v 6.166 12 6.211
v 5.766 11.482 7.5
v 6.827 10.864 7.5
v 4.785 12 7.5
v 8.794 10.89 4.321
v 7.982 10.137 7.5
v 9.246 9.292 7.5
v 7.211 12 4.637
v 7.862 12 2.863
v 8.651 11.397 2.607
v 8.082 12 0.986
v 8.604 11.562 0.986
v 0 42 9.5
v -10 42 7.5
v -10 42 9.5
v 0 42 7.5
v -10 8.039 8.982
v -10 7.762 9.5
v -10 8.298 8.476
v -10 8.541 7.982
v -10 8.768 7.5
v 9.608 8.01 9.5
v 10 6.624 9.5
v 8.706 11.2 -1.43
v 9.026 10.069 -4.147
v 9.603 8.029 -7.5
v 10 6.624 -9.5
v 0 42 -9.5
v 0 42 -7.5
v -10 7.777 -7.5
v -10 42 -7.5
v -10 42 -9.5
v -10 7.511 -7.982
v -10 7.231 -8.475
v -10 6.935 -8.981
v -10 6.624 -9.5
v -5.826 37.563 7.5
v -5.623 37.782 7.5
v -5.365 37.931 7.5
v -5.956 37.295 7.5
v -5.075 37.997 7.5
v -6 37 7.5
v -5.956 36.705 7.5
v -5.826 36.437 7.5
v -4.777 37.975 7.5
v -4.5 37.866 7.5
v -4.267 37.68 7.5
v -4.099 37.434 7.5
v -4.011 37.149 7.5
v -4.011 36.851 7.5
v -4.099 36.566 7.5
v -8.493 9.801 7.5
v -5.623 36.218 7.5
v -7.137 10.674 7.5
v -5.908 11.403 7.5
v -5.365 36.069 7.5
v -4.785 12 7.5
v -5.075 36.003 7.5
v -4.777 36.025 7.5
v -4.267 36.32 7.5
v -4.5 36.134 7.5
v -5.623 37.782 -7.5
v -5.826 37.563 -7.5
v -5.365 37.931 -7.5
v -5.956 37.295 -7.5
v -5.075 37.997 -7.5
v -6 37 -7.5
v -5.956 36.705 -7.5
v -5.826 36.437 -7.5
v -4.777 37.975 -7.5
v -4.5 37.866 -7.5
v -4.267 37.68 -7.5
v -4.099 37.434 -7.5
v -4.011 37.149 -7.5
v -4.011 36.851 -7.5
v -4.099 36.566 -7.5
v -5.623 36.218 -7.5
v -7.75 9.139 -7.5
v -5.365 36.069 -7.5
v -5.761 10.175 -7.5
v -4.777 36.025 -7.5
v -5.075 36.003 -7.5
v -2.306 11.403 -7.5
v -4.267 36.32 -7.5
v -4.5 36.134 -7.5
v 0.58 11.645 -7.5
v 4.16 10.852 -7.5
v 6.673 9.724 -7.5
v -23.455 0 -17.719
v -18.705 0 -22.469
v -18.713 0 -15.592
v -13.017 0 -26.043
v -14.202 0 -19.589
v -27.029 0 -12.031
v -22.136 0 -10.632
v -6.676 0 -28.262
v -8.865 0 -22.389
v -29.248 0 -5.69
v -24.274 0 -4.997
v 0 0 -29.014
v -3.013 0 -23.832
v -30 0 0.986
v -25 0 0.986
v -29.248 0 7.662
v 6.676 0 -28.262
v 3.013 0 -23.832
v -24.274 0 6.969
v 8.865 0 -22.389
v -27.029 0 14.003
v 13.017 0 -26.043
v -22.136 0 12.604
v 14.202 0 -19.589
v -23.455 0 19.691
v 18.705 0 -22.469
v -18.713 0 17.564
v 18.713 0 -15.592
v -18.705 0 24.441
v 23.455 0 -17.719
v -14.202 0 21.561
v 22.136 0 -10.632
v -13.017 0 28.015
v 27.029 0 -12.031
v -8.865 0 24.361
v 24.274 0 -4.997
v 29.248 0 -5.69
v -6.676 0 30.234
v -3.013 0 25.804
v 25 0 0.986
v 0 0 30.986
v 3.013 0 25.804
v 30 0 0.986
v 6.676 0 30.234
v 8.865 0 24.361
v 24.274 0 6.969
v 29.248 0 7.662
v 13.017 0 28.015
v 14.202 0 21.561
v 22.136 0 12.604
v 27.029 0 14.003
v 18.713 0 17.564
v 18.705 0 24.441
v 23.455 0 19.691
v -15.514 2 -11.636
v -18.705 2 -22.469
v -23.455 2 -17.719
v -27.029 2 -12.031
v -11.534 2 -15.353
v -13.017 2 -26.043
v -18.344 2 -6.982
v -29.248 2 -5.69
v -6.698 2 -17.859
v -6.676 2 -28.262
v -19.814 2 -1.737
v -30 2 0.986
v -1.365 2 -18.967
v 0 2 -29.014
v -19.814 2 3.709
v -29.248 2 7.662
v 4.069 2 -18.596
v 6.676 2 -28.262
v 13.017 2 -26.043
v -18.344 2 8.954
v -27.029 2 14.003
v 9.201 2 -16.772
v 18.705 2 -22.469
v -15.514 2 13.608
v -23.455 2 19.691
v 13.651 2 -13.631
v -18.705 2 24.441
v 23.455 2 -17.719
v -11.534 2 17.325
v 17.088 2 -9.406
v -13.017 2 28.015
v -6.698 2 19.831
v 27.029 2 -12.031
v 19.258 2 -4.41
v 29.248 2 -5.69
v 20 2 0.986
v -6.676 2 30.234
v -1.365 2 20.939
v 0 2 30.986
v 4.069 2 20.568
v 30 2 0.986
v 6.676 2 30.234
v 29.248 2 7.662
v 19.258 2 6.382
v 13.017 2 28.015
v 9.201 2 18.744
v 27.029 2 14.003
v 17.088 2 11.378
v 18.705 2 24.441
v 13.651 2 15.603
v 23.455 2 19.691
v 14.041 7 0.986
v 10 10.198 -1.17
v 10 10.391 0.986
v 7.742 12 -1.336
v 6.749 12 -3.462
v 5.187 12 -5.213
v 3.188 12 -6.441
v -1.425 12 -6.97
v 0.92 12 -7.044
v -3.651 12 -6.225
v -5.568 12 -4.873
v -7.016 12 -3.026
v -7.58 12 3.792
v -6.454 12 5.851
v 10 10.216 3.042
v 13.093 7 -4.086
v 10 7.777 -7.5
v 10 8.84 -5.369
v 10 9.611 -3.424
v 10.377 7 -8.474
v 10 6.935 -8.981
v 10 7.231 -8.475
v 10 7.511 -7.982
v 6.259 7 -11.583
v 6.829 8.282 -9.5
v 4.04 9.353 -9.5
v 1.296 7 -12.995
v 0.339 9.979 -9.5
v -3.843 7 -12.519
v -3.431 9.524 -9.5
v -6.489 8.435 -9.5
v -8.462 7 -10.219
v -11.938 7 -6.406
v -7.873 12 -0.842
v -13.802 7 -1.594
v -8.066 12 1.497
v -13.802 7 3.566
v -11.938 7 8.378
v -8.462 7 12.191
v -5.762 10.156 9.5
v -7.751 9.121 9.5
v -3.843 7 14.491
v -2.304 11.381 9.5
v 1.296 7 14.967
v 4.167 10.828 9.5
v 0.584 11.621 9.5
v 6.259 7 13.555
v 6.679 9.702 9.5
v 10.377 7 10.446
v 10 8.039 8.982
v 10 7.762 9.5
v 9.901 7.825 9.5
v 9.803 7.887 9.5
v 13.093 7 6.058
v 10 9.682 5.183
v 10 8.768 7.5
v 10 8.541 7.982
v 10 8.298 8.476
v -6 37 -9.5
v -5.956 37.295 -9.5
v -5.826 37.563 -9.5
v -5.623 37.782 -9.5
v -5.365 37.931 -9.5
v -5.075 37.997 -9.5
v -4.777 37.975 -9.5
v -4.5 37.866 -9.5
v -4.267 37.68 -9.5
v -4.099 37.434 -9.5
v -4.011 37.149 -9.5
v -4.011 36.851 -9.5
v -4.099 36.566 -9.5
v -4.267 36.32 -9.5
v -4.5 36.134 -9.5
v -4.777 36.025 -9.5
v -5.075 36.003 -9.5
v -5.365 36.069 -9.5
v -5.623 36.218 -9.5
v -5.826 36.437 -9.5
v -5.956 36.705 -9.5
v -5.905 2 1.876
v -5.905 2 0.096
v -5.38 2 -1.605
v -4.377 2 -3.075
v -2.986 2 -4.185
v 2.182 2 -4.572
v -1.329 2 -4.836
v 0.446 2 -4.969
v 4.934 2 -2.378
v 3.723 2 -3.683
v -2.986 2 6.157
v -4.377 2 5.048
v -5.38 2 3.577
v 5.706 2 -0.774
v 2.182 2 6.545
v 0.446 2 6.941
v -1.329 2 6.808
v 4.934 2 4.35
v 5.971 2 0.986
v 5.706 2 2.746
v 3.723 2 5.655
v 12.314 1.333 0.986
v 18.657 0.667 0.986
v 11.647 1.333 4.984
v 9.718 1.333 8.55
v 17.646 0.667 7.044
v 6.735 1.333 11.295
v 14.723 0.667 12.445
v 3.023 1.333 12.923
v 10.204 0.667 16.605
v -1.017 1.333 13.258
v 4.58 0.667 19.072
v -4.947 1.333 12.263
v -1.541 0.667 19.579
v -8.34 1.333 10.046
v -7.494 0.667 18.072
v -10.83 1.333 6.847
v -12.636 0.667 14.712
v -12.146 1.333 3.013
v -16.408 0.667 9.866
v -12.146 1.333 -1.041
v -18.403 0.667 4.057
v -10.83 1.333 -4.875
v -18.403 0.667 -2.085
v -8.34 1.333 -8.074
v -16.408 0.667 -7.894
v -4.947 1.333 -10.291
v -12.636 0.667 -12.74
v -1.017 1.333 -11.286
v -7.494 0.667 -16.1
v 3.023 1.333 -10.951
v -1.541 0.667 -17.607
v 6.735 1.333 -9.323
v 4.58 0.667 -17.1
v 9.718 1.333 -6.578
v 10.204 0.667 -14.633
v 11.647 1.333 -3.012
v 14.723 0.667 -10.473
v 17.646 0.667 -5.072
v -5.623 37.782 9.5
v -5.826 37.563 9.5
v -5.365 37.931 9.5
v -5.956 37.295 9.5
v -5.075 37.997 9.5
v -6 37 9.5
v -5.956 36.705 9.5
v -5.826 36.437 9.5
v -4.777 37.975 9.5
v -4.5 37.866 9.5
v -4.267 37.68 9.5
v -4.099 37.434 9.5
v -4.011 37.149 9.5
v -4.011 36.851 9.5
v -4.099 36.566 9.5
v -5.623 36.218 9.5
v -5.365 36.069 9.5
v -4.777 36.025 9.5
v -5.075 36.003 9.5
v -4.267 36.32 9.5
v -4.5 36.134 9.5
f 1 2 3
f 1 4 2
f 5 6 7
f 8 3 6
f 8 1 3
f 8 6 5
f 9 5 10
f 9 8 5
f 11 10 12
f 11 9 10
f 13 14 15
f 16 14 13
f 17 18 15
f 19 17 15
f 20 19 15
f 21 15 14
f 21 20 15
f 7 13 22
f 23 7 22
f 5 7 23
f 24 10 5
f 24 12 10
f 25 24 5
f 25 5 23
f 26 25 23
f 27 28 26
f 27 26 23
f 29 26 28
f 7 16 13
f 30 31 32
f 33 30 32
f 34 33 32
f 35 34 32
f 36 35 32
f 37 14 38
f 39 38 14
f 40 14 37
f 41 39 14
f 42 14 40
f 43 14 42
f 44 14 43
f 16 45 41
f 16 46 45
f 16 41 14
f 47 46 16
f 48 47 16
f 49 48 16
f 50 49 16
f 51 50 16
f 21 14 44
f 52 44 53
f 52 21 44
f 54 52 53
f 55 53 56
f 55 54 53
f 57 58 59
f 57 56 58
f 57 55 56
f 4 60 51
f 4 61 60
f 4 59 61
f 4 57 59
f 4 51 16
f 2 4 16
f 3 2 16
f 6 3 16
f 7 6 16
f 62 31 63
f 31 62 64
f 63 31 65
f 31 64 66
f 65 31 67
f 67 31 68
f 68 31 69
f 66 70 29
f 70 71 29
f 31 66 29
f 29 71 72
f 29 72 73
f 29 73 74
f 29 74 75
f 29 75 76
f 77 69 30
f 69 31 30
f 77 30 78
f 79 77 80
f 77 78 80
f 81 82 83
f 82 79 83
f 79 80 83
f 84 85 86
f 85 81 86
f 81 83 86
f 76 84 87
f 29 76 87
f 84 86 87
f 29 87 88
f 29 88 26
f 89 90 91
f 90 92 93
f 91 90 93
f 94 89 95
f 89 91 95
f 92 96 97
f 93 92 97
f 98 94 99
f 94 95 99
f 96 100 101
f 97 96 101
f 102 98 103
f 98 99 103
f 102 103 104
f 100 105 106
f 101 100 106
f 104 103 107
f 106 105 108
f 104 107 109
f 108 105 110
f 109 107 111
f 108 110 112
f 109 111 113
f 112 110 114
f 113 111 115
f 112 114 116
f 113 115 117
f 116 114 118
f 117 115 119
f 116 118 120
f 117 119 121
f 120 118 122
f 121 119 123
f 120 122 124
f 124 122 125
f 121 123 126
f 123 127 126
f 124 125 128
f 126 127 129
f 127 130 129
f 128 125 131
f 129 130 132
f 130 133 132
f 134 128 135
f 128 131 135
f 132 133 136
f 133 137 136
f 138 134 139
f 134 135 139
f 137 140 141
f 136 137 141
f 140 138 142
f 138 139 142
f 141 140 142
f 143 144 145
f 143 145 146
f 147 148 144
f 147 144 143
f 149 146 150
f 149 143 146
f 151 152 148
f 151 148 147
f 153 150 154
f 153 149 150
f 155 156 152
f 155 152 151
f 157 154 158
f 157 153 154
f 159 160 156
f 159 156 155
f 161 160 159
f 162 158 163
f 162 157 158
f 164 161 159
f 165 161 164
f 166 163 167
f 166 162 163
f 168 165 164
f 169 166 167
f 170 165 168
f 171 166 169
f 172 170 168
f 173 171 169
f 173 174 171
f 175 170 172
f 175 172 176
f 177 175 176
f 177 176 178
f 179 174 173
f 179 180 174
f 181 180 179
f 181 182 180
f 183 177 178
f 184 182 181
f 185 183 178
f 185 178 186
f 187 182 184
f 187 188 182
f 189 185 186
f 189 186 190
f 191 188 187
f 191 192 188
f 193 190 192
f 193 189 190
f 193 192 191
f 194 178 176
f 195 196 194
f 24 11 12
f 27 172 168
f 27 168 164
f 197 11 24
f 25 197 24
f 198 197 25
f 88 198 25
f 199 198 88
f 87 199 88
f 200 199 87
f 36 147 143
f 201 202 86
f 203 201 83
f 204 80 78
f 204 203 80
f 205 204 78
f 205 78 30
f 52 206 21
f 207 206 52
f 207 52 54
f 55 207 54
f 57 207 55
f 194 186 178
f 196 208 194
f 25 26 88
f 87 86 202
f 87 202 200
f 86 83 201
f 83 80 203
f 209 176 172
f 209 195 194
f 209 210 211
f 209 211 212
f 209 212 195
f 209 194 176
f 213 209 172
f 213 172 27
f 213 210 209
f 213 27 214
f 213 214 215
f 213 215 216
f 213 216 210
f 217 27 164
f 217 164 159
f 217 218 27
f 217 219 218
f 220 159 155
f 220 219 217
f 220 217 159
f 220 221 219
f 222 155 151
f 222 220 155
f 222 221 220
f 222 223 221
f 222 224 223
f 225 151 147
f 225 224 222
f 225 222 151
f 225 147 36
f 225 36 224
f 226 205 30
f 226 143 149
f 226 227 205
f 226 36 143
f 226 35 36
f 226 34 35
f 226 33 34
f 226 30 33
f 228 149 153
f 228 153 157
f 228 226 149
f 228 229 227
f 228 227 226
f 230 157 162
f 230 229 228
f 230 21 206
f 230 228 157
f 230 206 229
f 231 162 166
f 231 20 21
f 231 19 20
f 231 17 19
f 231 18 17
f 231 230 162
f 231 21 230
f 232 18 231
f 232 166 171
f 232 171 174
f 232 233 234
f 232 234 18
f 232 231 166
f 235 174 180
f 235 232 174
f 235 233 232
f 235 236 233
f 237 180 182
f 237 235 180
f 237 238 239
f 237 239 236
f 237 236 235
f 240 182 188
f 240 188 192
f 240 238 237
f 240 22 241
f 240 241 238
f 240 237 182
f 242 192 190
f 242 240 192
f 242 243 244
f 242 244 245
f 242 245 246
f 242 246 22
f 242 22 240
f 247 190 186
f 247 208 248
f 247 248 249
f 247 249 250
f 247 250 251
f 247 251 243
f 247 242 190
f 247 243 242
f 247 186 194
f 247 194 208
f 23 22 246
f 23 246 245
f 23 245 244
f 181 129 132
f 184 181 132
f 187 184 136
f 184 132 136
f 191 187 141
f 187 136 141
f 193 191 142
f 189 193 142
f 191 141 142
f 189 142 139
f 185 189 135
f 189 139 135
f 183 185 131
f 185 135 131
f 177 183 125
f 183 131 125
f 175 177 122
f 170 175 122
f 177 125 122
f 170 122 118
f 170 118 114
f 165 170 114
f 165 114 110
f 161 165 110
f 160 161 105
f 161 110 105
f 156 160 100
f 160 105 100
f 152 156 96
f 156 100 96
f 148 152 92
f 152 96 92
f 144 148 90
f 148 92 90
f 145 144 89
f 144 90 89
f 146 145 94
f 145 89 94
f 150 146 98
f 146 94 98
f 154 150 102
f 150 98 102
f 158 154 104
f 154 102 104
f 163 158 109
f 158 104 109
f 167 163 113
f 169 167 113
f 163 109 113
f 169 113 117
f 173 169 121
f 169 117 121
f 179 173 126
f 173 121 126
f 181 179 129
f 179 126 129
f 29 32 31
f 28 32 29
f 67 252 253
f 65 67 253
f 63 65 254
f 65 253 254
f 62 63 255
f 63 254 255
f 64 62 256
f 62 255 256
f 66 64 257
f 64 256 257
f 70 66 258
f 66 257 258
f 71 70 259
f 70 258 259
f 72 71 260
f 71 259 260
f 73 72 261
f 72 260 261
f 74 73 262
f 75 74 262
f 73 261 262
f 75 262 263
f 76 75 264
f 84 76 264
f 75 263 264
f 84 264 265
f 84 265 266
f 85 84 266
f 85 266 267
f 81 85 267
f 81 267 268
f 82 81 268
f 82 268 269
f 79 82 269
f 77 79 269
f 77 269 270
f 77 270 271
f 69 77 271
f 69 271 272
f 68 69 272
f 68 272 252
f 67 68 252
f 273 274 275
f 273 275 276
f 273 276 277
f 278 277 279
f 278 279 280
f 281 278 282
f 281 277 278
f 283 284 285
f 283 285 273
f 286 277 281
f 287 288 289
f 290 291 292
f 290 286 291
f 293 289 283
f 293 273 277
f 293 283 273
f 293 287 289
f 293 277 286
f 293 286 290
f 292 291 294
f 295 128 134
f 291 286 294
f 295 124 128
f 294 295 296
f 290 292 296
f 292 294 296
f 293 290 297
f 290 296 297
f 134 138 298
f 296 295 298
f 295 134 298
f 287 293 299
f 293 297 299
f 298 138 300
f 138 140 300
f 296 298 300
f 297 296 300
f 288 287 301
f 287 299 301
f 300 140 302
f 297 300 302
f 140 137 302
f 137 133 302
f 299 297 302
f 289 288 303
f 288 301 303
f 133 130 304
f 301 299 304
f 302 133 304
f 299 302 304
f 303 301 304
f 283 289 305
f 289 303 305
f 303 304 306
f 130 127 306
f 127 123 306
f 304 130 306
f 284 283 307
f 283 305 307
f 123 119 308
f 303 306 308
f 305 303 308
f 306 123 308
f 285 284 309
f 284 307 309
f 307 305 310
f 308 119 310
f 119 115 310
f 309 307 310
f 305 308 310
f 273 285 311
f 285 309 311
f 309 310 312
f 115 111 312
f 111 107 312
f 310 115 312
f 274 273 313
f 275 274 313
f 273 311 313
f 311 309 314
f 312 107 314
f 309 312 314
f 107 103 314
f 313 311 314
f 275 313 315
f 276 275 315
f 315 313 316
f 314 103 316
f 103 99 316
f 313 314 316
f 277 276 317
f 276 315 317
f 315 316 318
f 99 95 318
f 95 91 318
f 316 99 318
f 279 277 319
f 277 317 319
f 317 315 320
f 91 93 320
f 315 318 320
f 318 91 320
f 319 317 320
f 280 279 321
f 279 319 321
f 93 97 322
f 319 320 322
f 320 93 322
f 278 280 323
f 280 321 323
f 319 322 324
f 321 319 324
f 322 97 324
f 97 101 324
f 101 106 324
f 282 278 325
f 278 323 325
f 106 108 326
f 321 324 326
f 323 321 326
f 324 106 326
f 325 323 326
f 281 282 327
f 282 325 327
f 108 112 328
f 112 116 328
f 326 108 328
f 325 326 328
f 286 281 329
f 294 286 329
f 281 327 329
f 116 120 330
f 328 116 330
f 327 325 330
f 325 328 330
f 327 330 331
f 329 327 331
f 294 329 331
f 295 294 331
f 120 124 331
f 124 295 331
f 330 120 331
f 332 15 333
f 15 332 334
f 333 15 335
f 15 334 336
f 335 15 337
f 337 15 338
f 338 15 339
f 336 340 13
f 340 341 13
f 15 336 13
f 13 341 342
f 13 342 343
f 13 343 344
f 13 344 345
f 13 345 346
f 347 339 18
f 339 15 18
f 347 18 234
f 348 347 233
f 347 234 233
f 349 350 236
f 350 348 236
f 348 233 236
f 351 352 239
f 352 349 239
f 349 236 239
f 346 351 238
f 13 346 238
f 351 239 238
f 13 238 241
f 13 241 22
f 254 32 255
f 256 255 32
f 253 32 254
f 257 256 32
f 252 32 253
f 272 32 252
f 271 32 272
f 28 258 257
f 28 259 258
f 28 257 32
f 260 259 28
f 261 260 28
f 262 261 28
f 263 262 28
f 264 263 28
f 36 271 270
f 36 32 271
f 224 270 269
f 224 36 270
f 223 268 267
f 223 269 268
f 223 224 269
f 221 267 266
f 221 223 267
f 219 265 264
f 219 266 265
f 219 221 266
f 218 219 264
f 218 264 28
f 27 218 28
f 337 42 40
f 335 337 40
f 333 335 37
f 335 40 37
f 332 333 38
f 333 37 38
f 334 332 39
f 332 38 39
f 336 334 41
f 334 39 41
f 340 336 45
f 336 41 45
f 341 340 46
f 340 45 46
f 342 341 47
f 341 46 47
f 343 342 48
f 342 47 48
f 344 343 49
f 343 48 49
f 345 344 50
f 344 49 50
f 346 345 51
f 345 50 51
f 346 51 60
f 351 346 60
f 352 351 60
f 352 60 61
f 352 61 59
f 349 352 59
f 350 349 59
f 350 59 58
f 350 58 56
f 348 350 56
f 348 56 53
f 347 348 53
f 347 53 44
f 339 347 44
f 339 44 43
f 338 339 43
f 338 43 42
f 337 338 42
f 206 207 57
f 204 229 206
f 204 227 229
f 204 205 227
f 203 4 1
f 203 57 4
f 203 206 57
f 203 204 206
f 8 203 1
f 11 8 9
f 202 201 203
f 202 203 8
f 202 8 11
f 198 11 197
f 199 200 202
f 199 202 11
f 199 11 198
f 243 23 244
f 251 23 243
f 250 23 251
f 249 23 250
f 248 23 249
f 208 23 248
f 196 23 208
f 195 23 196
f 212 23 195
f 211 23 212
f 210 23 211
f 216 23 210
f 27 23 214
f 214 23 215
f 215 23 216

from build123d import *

# Parameters (mm, degrees)
SKETCH1_R           = 30
BOSS_EXTRUDE1_DEPTH = 2
SKETCH2_R           = 20
BOSS_EXTRUDE2_DEPTH = 10
BOSS_EXTRUDE2_TAPER = 50
SKETCH3_W           = 20
SKETCH3_H           = 2
BOSS_EXTRUDE3_DEPTH = 40
CUT_EXTRUDE1_REACH  = 67.598
CUT_EXTRUDE2_REACH  = 67.598
SKETCH7_R           = 1
SKETCH8_R           = 25
CUT_EXTRUDE3_DEPTH  = 2
CUT_EXTRUDE3_DRAFT  = -84


with BuildPart() as part:
    # Sketch1 → Boss-Extrude1 (new body)
    with BuildSketch(Plane(origin=(0, 0, 0), x_dir=(1, 0, 0), z_dir=(0, 1, 0))):
        with Locations(Location((0, -0.986006094, 0), (0, 0, 270))):
            Circle(SKETCH1_R)
    extrude(amount=BOSS_EXTRUDE1_DEPTH)

    # Sketch2 → Boss-Extrude2 (add)
    with BuildSketch(Plane(origin=(0, 2, 0), x_dir=(1, 0, 0), z_dir=(0, 1, 0))):
        with Locations((0, -0.986006094)):
            Circle(SKETCH2_R)
    extrude(amount=BOSS_EXTRUDE2_DEPTH, taper=BOSS_EXTRUDE2_TAPER)

    # Sketch3 → Boss-Extrude3 (add)
    with BuildSketch(Plane(origin=(0, 2, 0), x_dir=(1, 0, 0), z_dir=(0, 1, 0))):
        with Locations((0, 8.5)):
            Rectangle(SKETCH3_W, SKETCH3_H)
        with Locations((0, -8.5)):
            Rectangle(SKETCH3_W, SKETCH3_H)
    extrude(amount=BOSS_EXTRUDE3_DEPTH)

    # Cut-Extrude1: up to this face of the body (flat: up to its plane)
    cut_extrude1_end = Plane(part.part.faces().sort_by_distance((0, 26.093864251, 9.5))[0])
    # Sketch5 → Cut-Extrude1 (cut, up to the picked face)
    with BuildSketch(Plane(origin=(0, 0, -9.5), x_dir=(-1, 0, 0), z_dir=(0, 0, -1)), mode=Mode.PRIVATE) as cut_extrude1_sk1:
        Polygon((0, 42), (-10, 6.623548306), (-10, 42), align=None)
    cut_extrude1_tool1 = split(extrude(cut_extrude1_sk1.sketch, amount=-CUT_EXTRUDE1_REACH, mode=Mode.PRIVATE), bisect_by=cut_extrude1_end, keep=Keep.BOTH, mode=Mode.PRIVATE)
    add(cut_extrude1_tool1.solids().sort_by(Axis((6.666667, 30.207849, -9.5), (0, 0, 1)))[0], mode=Mode.SUBTRACT)

    # Cut-Extrude2: up to this face of the body (flat: up to its plane)
    cut_extrude2_end = Plane(part.part.faces().sort_by_distance((-2.565960576, 24.498389602, 9.5))[0])
    # Sketch7 → Cut-Extrude2 (cut, up to the picked face)
    with BuildSketch(Plane(origin=(0, 0, -9.5), x_dir=(-1, 0, 0), z_dir=(0, 0, -1)), mode=Mode.PRIVATE) as cut_extrude2_sk1:
        with Locations((5, 37)):
            Circle(SKETCH7_R)
    cut_extrude2_tool1 = split(extrude(cut_extrude2_sk1.sketch, amount=-CUT_EXTRUDE2_REACH, mode=Mode.PRIVATE), bisect_by=cut_extrude2_end, keep=Keep.BOTH, mode=Mode.PRIVATE)
    add(cut_extrude2_tool1.solids().sort_by(Axis((-5, 37, -9.5), (0, 0, 1)))[0], mode=Mode.SUBTRACT)


with BuildPart() as cut_extrude3_tool:
    # Sketch8 → Cut-Extrude3 (with draft: the straight prism first)
    with BuildSketch(Plane.XZ):
        with Locations((0, 0.986006094)):
            Circle(SKETCH8_R)
    extrude(amount=-CUT_EXTRUDE3_DEPTH)
    # Cut-Extrude3: the draft: its side faces are tilted about the plane it starts from
    cut_extrude3_sides = [cut_extrude3_tool.faces().sort_by_distance(p)[0] for p in [
        (-25, 1, 0.986006094),
    ]]
    draft(cut_extrude3_sides, Plane.XZ, CUT_EXTRUDE3_DRAFT)


with BuildPart() as part_1:
    add(part.part)

    # Cut-Extrude3: cut by cut_extrude3_tool
    add(cut_extrude3_tool.part, mode=Mode.SUBTRACT)


solid = part_1.part
